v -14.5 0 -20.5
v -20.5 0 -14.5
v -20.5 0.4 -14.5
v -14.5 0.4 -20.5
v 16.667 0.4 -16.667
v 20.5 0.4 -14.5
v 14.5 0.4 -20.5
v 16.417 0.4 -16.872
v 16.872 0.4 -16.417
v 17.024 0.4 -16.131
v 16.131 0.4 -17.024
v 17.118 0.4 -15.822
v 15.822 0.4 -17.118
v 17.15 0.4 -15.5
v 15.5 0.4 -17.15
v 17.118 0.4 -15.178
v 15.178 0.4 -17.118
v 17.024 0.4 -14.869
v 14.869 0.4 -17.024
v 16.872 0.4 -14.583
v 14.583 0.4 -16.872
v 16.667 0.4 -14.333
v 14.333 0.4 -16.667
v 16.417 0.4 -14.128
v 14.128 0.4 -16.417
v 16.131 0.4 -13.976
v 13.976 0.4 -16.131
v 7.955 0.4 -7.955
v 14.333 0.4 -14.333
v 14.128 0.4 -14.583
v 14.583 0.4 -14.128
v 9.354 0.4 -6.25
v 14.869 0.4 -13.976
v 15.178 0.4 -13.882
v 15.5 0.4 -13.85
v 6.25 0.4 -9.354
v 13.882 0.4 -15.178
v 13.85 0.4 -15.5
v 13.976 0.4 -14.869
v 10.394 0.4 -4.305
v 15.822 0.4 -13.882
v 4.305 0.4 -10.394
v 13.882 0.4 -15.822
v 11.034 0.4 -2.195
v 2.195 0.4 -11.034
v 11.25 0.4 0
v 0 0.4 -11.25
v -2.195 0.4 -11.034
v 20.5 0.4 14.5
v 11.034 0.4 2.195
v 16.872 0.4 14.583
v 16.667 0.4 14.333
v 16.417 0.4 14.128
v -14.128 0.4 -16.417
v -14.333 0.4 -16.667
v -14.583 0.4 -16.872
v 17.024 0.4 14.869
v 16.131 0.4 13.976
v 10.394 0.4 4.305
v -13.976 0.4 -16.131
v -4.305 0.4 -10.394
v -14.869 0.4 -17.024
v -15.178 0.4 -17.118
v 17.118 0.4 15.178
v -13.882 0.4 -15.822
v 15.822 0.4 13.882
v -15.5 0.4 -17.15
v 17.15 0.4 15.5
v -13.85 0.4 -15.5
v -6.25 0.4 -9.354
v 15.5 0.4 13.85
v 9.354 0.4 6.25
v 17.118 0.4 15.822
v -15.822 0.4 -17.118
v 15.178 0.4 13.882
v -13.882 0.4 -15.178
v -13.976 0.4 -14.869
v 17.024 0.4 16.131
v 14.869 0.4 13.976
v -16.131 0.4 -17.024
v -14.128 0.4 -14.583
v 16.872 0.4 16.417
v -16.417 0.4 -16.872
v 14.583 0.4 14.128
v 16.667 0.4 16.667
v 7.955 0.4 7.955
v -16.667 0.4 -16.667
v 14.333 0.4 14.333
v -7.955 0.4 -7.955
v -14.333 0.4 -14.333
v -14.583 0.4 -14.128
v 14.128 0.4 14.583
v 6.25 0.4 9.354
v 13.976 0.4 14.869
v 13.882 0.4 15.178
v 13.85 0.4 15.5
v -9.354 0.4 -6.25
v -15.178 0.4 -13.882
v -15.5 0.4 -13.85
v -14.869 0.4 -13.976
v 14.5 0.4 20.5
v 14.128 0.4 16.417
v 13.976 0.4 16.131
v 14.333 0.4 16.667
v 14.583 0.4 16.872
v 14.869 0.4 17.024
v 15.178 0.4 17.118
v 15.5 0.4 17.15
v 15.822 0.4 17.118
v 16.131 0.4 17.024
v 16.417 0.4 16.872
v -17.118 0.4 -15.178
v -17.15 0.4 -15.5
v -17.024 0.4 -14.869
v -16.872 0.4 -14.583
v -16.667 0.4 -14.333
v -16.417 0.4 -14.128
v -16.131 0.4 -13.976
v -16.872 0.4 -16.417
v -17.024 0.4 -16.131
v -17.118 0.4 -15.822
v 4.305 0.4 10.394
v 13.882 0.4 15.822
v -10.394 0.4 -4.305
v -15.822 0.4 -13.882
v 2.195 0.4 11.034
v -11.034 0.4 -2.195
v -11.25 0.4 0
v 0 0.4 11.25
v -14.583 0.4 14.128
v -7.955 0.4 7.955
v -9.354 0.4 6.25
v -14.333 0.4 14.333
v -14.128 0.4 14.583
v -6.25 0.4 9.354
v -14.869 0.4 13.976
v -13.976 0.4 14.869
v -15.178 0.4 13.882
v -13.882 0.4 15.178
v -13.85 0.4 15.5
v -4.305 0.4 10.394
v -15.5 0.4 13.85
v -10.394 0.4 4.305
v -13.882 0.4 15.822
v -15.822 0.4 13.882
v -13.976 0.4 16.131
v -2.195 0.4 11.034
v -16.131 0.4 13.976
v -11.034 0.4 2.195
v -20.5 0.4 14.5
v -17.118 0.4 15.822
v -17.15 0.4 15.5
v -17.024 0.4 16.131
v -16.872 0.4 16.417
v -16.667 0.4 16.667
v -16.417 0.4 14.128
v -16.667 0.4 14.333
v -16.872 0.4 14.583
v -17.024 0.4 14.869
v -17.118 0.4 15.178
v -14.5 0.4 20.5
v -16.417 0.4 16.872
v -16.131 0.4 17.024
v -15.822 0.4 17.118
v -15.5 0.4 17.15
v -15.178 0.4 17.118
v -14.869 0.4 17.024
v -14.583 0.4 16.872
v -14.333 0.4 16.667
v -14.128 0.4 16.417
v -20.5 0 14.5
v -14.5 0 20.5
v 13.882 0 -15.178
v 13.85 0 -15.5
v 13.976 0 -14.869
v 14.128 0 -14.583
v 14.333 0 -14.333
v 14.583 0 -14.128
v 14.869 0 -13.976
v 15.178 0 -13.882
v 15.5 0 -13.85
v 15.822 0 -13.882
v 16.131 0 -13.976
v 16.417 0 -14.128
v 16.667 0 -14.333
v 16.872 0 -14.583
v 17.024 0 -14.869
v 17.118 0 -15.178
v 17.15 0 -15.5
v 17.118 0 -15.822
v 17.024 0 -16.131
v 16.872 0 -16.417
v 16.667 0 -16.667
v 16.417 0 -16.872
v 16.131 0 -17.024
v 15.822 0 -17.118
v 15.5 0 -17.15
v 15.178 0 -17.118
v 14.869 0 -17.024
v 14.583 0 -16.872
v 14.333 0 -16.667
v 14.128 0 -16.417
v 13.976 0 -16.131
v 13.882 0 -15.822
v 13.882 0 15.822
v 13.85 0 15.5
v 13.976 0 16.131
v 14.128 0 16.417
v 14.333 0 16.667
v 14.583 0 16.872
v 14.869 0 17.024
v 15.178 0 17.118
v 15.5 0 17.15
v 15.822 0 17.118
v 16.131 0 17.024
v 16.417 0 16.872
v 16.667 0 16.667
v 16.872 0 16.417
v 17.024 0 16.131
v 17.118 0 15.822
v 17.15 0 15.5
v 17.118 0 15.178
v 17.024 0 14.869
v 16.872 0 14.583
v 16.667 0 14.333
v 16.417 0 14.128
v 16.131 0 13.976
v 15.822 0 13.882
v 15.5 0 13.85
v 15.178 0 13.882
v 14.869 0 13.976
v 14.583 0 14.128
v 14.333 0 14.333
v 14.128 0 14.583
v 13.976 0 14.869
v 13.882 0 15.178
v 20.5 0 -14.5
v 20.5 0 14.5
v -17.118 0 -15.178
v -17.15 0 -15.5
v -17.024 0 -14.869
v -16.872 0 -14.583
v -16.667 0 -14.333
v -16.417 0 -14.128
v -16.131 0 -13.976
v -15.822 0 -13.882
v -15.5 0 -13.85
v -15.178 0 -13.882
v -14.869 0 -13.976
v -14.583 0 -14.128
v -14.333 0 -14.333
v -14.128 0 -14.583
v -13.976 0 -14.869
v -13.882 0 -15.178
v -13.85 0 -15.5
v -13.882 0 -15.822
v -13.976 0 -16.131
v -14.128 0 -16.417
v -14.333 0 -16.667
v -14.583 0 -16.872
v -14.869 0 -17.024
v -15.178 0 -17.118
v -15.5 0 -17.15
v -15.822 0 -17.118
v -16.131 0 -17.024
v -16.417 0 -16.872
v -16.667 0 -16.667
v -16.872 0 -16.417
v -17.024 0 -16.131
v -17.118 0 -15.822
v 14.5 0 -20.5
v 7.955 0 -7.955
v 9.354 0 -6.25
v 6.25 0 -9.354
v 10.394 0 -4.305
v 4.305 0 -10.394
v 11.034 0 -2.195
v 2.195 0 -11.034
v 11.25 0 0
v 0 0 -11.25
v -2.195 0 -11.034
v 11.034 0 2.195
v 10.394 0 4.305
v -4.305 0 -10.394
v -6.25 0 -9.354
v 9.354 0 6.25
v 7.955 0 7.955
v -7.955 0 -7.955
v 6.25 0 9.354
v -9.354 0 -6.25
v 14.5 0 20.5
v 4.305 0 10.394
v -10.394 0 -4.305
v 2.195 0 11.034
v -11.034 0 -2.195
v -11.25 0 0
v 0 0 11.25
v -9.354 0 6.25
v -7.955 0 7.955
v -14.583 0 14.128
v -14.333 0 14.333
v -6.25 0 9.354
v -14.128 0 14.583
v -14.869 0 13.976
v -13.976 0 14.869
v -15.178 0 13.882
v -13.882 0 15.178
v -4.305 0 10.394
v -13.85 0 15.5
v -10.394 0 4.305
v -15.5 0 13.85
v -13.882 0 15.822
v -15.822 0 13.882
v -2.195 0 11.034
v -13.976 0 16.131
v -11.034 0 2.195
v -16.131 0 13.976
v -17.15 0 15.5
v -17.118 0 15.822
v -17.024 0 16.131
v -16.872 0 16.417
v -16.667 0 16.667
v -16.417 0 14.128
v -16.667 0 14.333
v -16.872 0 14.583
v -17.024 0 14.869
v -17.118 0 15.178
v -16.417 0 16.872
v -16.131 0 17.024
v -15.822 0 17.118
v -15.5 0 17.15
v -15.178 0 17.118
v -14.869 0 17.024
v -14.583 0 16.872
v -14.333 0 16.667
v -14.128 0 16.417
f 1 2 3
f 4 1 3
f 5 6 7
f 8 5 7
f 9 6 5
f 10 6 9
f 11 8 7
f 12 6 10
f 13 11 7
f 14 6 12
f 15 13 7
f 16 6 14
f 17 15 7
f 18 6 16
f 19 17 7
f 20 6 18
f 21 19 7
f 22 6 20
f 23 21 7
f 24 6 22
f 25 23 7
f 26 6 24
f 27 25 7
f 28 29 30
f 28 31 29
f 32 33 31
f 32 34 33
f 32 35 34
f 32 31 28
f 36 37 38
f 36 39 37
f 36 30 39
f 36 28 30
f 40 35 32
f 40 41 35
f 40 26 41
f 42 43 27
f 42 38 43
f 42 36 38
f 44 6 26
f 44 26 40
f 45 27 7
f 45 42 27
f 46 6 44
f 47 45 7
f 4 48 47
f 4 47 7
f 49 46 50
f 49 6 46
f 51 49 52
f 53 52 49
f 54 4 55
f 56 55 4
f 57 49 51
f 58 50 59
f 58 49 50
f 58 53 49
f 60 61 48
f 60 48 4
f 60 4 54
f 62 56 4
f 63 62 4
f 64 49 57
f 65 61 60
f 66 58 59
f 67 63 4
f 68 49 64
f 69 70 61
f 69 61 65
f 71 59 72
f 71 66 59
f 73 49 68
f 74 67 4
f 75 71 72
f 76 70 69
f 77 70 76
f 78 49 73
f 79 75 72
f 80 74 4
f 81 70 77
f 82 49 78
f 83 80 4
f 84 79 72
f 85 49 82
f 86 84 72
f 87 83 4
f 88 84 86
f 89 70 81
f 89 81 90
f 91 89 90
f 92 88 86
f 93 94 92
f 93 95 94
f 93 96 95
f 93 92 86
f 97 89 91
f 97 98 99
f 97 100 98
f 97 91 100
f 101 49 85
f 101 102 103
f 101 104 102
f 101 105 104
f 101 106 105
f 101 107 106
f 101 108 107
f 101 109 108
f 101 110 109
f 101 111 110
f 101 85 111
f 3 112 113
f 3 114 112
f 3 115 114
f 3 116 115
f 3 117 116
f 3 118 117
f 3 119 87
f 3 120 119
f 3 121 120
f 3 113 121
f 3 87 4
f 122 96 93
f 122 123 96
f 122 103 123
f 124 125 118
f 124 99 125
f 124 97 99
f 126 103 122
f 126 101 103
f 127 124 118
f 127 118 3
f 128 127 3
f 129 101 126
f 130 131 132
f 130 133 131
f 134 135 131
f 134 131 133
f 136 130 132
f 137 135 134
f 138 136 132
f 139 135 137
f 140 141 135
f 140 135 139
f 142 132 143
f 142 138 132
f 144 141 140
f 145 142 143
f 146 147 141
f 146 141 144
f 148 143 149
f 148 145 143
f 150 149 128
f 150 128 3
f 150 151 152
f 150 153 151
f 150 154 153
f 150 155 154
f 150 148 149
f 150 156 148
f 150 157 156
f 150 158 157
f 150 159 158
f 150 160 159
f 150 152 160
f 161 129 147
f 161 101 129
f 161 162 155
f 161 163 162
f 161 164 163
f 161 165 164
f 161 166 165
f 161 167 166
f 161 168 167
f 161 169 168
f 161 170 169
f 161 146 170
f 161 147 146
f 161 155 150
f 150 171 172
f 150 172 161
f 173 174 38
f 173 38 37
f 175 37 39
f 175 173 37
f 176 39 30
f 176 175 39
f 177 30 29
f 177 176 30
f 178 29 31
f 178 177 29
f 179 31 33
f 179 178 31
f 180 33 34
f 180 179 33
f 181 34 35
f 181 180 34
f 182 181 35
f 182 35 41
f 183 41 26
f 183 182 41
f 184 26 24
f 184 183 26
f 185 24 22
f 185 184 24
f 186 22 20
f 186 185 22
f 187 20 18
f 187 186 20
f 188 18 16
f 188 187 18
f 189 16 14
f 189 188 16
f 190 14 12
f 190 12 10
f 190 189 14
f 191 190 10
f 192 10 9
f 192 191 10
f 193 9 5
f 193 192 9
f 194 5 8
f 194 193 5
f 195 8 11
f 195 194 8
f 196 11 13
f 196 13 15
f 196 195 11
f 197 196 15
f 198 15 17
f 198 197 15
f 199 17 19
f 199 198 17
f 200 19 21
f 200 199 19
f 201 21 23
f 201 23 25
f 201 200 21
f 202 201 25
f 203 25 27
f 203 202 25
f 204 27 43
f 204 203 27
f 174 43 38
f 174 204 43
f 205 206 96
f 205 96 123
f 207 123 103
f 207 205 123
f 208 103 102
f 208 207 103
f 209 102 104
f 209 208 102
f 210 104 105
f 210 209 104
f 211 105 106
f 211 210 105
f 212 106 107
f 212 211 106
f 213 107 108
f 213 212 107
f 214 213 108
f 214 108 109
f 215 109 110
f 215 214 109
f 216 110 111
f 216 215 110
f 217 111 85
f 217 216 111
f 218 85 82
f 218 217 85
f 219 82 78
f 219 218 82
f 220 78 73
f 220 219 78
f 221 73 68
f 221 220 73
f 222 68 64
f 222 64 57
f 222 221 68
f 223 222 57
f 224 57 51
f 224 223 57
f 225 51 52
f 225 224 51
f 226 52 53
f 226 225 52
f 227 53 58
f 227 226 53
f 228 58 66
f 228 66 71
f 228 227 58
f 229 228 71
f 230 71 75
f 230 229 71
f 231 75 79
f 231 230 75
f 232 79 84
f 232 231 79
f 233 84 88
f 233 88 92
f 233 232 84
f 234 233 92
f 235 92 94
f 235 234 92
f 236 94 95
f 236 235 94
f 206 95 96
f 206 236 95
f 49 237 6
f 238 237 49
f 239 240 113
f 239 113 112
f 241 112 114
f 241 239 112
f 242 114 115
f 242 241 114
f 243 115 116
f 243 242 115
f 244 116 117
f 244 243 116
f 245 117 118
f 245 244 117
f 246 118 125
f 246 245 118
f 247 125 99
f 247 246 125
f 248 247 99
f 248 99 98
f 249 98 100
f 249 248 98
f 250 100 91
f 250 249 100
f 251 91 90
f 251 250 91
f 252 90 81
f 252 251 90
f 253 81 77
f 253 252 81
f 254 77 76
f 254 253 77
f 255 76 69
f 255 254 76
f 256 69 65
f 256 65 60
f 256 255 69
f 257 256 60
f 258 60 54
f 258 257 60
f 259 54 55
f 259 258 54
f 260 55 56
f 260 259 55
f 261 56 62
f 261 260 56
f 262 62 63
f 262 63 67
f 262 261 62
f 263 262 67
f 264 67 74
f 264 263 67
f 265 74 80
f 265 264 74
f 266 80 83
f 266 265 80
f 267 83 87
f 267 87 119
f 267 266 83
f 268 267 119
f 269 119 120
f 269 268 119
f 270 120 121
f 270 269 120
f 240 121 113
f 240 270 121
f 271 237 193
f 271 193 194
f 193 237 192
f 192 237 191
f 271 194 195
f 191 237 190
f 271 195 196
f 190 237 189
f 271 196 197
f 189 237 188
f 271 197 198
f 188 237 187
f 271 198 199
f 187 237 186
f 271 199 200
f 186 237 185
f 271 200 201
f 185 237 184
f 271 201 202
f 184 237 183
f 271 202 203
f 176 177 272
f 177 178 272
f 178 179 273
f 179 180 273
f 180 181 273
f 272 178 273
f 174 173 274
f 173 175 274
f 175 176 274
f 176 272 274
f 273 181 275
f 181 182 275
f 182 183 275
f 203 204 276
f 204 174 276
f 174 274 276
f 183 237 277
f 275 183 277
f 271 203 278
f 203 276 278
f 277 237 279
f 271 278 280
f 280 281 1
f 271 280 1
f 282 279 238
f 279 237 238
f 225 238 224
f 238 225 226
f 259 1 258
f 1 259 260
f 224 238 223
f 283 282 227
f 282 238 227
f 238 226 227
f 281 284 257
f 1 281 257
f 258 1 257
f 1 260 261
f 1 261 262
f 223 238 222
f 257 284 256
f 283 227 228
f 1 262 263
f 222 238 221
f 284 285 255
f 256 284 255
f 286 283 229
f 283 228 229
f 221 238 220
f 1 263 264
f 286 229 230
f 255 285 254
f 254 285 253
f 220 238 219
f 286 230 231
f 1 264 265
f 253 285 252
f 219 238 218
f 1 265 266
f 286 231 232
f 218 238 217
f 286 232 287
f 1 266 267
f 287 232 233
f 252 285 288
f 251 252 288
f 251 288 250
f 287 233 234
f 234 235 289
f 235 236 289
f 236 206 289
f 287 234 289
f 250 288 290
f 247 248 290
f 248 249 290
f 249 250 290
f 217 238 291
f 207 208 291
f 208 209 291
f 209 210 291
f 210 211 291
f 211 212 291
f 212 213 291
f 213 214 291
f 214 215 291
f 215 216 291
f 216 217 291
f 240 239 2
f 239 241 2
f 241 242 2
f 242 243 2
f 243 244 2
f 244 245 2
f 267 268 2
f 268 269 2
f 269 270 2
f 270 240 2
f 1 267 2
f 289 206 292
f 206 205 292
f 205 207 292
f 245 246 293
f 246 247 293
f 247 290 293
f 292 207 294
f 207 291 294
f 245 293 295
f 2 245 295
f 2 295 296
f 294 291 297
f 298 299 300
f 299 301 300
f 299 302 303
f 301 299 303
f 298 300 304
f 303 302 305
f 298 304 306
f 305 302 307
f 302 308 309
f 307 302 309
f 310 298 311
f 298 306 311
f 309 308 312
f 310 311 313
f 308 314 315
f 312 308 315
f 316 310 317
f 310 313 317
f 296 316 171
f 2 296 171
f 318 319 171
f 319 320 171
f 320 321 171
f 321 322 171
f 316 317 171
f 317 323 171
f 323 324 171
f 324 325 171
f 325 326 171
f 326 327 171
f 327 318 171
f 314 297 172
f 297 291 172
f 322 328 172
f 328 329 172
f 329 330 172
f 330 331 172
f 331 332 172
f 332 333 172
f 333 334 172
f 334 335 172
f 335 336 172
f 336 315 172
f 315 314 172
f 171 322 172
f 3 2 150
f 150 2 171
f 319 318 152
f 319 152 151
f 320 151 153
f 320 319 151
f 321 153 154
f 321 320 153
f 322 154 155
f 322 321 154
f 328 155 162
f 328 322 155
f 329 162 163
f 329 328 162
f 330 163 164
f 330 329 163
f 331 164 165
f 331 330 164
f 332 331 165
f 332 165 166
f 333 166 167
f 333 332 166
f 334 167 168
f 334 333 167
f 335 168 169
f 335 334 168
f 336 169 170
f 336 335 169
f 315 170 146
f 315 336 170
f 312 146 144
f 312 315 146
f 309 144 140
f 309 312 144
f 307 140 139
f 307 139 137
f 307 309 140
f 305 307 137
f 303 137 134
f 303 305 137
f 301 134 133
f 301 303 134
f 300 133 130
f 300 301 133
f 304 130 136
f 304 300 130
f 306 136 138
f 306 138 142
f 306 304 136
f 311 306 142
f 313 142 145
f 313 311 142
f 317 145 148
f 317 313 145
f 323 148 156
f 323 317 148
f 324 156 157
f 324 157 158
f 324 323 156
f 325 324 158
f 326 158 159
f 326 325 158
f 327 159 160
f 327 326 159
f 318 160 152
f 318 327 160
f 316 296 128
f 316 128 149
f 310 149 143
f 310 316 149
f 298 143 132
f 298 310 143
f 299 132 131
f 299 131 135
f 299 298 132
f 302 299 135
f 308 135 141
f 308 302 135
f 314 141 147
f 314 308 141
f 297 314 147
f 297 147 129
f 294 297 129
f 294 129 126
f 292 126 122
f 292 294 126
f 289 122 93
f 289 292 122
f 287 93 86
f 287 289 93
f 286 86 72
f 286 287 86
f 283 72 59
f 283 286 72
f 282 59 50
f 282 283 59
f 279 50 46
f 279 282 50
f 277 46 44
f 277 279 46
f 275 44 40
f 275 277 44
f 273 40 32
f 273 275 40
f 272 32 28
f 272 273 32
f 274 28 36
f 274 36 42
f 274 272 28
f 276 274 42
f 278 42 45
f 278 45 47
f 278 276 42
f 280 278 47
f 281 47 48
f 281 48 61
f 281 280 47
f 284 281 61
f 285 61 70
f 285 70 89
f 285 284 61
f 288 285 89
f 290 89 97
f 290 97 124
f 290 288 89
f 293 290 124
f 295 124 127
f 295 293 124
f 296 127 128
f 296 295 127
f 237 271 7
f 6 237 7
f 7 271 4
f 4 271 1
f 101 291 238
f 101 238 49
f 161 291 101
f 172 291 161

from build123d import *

# Parameters (mm, degrees)
SKETCH1_W           = 41
SKETCH1_H           = 41
SKETCH1_R           = 11.25
SKETCH1_R_2         = 1.65
BOSS_EXTRUDE1_DEPTH = 0.4
CHAMFER1_SIZE       = 6


with BuildPart() as part:
    # Sketch1 → Boss-Extrude1 (new body)
    with BuildSketch(Plane(origin=(0, 0, 0), x_dir=(-1, 0, 0), z_dir=(0, 1, 0))):
        Rectangle(SKETCH1_W, SKETCH1_H)
        Circle(SKETCH1_R, mode=Mode.SUBTRACT)
        with Locations((15.5, 15.5)):
            Circle(SKETCH1_R_2, mode=Mode.SUBTRACT)
        with Locations((-15.5, 15.5)):
            Circle(SKETCH1_R_2, mode=Mode.SUBTRACT)
        with Locations((-15.5, -15.5)):
            Circle(SKETCH1_R_2, mode=Mode.SUBTRACT)
        with Locations((15.5, -15.5)):
            Circle(SKETCH1_R_2, mode=Mode.SUBTRACT)
    extrude(amount=BOSS_EXTRUDE1_DEPTH)

    # Chamfer1
    chamfer1_edges = [part.edges().sort_by_distance(p)[0] for p in [
        (-20.5, 0.2, -20.5),
        (20.5, 0.2, -20.5),
        (20.5, 0.2, 20.5),
        (-20.5, 0.2, 20.5),
    ]]
    chamfer(chamfer1_edges, length=CHAMFER1_SIZE)


solid = part.part
